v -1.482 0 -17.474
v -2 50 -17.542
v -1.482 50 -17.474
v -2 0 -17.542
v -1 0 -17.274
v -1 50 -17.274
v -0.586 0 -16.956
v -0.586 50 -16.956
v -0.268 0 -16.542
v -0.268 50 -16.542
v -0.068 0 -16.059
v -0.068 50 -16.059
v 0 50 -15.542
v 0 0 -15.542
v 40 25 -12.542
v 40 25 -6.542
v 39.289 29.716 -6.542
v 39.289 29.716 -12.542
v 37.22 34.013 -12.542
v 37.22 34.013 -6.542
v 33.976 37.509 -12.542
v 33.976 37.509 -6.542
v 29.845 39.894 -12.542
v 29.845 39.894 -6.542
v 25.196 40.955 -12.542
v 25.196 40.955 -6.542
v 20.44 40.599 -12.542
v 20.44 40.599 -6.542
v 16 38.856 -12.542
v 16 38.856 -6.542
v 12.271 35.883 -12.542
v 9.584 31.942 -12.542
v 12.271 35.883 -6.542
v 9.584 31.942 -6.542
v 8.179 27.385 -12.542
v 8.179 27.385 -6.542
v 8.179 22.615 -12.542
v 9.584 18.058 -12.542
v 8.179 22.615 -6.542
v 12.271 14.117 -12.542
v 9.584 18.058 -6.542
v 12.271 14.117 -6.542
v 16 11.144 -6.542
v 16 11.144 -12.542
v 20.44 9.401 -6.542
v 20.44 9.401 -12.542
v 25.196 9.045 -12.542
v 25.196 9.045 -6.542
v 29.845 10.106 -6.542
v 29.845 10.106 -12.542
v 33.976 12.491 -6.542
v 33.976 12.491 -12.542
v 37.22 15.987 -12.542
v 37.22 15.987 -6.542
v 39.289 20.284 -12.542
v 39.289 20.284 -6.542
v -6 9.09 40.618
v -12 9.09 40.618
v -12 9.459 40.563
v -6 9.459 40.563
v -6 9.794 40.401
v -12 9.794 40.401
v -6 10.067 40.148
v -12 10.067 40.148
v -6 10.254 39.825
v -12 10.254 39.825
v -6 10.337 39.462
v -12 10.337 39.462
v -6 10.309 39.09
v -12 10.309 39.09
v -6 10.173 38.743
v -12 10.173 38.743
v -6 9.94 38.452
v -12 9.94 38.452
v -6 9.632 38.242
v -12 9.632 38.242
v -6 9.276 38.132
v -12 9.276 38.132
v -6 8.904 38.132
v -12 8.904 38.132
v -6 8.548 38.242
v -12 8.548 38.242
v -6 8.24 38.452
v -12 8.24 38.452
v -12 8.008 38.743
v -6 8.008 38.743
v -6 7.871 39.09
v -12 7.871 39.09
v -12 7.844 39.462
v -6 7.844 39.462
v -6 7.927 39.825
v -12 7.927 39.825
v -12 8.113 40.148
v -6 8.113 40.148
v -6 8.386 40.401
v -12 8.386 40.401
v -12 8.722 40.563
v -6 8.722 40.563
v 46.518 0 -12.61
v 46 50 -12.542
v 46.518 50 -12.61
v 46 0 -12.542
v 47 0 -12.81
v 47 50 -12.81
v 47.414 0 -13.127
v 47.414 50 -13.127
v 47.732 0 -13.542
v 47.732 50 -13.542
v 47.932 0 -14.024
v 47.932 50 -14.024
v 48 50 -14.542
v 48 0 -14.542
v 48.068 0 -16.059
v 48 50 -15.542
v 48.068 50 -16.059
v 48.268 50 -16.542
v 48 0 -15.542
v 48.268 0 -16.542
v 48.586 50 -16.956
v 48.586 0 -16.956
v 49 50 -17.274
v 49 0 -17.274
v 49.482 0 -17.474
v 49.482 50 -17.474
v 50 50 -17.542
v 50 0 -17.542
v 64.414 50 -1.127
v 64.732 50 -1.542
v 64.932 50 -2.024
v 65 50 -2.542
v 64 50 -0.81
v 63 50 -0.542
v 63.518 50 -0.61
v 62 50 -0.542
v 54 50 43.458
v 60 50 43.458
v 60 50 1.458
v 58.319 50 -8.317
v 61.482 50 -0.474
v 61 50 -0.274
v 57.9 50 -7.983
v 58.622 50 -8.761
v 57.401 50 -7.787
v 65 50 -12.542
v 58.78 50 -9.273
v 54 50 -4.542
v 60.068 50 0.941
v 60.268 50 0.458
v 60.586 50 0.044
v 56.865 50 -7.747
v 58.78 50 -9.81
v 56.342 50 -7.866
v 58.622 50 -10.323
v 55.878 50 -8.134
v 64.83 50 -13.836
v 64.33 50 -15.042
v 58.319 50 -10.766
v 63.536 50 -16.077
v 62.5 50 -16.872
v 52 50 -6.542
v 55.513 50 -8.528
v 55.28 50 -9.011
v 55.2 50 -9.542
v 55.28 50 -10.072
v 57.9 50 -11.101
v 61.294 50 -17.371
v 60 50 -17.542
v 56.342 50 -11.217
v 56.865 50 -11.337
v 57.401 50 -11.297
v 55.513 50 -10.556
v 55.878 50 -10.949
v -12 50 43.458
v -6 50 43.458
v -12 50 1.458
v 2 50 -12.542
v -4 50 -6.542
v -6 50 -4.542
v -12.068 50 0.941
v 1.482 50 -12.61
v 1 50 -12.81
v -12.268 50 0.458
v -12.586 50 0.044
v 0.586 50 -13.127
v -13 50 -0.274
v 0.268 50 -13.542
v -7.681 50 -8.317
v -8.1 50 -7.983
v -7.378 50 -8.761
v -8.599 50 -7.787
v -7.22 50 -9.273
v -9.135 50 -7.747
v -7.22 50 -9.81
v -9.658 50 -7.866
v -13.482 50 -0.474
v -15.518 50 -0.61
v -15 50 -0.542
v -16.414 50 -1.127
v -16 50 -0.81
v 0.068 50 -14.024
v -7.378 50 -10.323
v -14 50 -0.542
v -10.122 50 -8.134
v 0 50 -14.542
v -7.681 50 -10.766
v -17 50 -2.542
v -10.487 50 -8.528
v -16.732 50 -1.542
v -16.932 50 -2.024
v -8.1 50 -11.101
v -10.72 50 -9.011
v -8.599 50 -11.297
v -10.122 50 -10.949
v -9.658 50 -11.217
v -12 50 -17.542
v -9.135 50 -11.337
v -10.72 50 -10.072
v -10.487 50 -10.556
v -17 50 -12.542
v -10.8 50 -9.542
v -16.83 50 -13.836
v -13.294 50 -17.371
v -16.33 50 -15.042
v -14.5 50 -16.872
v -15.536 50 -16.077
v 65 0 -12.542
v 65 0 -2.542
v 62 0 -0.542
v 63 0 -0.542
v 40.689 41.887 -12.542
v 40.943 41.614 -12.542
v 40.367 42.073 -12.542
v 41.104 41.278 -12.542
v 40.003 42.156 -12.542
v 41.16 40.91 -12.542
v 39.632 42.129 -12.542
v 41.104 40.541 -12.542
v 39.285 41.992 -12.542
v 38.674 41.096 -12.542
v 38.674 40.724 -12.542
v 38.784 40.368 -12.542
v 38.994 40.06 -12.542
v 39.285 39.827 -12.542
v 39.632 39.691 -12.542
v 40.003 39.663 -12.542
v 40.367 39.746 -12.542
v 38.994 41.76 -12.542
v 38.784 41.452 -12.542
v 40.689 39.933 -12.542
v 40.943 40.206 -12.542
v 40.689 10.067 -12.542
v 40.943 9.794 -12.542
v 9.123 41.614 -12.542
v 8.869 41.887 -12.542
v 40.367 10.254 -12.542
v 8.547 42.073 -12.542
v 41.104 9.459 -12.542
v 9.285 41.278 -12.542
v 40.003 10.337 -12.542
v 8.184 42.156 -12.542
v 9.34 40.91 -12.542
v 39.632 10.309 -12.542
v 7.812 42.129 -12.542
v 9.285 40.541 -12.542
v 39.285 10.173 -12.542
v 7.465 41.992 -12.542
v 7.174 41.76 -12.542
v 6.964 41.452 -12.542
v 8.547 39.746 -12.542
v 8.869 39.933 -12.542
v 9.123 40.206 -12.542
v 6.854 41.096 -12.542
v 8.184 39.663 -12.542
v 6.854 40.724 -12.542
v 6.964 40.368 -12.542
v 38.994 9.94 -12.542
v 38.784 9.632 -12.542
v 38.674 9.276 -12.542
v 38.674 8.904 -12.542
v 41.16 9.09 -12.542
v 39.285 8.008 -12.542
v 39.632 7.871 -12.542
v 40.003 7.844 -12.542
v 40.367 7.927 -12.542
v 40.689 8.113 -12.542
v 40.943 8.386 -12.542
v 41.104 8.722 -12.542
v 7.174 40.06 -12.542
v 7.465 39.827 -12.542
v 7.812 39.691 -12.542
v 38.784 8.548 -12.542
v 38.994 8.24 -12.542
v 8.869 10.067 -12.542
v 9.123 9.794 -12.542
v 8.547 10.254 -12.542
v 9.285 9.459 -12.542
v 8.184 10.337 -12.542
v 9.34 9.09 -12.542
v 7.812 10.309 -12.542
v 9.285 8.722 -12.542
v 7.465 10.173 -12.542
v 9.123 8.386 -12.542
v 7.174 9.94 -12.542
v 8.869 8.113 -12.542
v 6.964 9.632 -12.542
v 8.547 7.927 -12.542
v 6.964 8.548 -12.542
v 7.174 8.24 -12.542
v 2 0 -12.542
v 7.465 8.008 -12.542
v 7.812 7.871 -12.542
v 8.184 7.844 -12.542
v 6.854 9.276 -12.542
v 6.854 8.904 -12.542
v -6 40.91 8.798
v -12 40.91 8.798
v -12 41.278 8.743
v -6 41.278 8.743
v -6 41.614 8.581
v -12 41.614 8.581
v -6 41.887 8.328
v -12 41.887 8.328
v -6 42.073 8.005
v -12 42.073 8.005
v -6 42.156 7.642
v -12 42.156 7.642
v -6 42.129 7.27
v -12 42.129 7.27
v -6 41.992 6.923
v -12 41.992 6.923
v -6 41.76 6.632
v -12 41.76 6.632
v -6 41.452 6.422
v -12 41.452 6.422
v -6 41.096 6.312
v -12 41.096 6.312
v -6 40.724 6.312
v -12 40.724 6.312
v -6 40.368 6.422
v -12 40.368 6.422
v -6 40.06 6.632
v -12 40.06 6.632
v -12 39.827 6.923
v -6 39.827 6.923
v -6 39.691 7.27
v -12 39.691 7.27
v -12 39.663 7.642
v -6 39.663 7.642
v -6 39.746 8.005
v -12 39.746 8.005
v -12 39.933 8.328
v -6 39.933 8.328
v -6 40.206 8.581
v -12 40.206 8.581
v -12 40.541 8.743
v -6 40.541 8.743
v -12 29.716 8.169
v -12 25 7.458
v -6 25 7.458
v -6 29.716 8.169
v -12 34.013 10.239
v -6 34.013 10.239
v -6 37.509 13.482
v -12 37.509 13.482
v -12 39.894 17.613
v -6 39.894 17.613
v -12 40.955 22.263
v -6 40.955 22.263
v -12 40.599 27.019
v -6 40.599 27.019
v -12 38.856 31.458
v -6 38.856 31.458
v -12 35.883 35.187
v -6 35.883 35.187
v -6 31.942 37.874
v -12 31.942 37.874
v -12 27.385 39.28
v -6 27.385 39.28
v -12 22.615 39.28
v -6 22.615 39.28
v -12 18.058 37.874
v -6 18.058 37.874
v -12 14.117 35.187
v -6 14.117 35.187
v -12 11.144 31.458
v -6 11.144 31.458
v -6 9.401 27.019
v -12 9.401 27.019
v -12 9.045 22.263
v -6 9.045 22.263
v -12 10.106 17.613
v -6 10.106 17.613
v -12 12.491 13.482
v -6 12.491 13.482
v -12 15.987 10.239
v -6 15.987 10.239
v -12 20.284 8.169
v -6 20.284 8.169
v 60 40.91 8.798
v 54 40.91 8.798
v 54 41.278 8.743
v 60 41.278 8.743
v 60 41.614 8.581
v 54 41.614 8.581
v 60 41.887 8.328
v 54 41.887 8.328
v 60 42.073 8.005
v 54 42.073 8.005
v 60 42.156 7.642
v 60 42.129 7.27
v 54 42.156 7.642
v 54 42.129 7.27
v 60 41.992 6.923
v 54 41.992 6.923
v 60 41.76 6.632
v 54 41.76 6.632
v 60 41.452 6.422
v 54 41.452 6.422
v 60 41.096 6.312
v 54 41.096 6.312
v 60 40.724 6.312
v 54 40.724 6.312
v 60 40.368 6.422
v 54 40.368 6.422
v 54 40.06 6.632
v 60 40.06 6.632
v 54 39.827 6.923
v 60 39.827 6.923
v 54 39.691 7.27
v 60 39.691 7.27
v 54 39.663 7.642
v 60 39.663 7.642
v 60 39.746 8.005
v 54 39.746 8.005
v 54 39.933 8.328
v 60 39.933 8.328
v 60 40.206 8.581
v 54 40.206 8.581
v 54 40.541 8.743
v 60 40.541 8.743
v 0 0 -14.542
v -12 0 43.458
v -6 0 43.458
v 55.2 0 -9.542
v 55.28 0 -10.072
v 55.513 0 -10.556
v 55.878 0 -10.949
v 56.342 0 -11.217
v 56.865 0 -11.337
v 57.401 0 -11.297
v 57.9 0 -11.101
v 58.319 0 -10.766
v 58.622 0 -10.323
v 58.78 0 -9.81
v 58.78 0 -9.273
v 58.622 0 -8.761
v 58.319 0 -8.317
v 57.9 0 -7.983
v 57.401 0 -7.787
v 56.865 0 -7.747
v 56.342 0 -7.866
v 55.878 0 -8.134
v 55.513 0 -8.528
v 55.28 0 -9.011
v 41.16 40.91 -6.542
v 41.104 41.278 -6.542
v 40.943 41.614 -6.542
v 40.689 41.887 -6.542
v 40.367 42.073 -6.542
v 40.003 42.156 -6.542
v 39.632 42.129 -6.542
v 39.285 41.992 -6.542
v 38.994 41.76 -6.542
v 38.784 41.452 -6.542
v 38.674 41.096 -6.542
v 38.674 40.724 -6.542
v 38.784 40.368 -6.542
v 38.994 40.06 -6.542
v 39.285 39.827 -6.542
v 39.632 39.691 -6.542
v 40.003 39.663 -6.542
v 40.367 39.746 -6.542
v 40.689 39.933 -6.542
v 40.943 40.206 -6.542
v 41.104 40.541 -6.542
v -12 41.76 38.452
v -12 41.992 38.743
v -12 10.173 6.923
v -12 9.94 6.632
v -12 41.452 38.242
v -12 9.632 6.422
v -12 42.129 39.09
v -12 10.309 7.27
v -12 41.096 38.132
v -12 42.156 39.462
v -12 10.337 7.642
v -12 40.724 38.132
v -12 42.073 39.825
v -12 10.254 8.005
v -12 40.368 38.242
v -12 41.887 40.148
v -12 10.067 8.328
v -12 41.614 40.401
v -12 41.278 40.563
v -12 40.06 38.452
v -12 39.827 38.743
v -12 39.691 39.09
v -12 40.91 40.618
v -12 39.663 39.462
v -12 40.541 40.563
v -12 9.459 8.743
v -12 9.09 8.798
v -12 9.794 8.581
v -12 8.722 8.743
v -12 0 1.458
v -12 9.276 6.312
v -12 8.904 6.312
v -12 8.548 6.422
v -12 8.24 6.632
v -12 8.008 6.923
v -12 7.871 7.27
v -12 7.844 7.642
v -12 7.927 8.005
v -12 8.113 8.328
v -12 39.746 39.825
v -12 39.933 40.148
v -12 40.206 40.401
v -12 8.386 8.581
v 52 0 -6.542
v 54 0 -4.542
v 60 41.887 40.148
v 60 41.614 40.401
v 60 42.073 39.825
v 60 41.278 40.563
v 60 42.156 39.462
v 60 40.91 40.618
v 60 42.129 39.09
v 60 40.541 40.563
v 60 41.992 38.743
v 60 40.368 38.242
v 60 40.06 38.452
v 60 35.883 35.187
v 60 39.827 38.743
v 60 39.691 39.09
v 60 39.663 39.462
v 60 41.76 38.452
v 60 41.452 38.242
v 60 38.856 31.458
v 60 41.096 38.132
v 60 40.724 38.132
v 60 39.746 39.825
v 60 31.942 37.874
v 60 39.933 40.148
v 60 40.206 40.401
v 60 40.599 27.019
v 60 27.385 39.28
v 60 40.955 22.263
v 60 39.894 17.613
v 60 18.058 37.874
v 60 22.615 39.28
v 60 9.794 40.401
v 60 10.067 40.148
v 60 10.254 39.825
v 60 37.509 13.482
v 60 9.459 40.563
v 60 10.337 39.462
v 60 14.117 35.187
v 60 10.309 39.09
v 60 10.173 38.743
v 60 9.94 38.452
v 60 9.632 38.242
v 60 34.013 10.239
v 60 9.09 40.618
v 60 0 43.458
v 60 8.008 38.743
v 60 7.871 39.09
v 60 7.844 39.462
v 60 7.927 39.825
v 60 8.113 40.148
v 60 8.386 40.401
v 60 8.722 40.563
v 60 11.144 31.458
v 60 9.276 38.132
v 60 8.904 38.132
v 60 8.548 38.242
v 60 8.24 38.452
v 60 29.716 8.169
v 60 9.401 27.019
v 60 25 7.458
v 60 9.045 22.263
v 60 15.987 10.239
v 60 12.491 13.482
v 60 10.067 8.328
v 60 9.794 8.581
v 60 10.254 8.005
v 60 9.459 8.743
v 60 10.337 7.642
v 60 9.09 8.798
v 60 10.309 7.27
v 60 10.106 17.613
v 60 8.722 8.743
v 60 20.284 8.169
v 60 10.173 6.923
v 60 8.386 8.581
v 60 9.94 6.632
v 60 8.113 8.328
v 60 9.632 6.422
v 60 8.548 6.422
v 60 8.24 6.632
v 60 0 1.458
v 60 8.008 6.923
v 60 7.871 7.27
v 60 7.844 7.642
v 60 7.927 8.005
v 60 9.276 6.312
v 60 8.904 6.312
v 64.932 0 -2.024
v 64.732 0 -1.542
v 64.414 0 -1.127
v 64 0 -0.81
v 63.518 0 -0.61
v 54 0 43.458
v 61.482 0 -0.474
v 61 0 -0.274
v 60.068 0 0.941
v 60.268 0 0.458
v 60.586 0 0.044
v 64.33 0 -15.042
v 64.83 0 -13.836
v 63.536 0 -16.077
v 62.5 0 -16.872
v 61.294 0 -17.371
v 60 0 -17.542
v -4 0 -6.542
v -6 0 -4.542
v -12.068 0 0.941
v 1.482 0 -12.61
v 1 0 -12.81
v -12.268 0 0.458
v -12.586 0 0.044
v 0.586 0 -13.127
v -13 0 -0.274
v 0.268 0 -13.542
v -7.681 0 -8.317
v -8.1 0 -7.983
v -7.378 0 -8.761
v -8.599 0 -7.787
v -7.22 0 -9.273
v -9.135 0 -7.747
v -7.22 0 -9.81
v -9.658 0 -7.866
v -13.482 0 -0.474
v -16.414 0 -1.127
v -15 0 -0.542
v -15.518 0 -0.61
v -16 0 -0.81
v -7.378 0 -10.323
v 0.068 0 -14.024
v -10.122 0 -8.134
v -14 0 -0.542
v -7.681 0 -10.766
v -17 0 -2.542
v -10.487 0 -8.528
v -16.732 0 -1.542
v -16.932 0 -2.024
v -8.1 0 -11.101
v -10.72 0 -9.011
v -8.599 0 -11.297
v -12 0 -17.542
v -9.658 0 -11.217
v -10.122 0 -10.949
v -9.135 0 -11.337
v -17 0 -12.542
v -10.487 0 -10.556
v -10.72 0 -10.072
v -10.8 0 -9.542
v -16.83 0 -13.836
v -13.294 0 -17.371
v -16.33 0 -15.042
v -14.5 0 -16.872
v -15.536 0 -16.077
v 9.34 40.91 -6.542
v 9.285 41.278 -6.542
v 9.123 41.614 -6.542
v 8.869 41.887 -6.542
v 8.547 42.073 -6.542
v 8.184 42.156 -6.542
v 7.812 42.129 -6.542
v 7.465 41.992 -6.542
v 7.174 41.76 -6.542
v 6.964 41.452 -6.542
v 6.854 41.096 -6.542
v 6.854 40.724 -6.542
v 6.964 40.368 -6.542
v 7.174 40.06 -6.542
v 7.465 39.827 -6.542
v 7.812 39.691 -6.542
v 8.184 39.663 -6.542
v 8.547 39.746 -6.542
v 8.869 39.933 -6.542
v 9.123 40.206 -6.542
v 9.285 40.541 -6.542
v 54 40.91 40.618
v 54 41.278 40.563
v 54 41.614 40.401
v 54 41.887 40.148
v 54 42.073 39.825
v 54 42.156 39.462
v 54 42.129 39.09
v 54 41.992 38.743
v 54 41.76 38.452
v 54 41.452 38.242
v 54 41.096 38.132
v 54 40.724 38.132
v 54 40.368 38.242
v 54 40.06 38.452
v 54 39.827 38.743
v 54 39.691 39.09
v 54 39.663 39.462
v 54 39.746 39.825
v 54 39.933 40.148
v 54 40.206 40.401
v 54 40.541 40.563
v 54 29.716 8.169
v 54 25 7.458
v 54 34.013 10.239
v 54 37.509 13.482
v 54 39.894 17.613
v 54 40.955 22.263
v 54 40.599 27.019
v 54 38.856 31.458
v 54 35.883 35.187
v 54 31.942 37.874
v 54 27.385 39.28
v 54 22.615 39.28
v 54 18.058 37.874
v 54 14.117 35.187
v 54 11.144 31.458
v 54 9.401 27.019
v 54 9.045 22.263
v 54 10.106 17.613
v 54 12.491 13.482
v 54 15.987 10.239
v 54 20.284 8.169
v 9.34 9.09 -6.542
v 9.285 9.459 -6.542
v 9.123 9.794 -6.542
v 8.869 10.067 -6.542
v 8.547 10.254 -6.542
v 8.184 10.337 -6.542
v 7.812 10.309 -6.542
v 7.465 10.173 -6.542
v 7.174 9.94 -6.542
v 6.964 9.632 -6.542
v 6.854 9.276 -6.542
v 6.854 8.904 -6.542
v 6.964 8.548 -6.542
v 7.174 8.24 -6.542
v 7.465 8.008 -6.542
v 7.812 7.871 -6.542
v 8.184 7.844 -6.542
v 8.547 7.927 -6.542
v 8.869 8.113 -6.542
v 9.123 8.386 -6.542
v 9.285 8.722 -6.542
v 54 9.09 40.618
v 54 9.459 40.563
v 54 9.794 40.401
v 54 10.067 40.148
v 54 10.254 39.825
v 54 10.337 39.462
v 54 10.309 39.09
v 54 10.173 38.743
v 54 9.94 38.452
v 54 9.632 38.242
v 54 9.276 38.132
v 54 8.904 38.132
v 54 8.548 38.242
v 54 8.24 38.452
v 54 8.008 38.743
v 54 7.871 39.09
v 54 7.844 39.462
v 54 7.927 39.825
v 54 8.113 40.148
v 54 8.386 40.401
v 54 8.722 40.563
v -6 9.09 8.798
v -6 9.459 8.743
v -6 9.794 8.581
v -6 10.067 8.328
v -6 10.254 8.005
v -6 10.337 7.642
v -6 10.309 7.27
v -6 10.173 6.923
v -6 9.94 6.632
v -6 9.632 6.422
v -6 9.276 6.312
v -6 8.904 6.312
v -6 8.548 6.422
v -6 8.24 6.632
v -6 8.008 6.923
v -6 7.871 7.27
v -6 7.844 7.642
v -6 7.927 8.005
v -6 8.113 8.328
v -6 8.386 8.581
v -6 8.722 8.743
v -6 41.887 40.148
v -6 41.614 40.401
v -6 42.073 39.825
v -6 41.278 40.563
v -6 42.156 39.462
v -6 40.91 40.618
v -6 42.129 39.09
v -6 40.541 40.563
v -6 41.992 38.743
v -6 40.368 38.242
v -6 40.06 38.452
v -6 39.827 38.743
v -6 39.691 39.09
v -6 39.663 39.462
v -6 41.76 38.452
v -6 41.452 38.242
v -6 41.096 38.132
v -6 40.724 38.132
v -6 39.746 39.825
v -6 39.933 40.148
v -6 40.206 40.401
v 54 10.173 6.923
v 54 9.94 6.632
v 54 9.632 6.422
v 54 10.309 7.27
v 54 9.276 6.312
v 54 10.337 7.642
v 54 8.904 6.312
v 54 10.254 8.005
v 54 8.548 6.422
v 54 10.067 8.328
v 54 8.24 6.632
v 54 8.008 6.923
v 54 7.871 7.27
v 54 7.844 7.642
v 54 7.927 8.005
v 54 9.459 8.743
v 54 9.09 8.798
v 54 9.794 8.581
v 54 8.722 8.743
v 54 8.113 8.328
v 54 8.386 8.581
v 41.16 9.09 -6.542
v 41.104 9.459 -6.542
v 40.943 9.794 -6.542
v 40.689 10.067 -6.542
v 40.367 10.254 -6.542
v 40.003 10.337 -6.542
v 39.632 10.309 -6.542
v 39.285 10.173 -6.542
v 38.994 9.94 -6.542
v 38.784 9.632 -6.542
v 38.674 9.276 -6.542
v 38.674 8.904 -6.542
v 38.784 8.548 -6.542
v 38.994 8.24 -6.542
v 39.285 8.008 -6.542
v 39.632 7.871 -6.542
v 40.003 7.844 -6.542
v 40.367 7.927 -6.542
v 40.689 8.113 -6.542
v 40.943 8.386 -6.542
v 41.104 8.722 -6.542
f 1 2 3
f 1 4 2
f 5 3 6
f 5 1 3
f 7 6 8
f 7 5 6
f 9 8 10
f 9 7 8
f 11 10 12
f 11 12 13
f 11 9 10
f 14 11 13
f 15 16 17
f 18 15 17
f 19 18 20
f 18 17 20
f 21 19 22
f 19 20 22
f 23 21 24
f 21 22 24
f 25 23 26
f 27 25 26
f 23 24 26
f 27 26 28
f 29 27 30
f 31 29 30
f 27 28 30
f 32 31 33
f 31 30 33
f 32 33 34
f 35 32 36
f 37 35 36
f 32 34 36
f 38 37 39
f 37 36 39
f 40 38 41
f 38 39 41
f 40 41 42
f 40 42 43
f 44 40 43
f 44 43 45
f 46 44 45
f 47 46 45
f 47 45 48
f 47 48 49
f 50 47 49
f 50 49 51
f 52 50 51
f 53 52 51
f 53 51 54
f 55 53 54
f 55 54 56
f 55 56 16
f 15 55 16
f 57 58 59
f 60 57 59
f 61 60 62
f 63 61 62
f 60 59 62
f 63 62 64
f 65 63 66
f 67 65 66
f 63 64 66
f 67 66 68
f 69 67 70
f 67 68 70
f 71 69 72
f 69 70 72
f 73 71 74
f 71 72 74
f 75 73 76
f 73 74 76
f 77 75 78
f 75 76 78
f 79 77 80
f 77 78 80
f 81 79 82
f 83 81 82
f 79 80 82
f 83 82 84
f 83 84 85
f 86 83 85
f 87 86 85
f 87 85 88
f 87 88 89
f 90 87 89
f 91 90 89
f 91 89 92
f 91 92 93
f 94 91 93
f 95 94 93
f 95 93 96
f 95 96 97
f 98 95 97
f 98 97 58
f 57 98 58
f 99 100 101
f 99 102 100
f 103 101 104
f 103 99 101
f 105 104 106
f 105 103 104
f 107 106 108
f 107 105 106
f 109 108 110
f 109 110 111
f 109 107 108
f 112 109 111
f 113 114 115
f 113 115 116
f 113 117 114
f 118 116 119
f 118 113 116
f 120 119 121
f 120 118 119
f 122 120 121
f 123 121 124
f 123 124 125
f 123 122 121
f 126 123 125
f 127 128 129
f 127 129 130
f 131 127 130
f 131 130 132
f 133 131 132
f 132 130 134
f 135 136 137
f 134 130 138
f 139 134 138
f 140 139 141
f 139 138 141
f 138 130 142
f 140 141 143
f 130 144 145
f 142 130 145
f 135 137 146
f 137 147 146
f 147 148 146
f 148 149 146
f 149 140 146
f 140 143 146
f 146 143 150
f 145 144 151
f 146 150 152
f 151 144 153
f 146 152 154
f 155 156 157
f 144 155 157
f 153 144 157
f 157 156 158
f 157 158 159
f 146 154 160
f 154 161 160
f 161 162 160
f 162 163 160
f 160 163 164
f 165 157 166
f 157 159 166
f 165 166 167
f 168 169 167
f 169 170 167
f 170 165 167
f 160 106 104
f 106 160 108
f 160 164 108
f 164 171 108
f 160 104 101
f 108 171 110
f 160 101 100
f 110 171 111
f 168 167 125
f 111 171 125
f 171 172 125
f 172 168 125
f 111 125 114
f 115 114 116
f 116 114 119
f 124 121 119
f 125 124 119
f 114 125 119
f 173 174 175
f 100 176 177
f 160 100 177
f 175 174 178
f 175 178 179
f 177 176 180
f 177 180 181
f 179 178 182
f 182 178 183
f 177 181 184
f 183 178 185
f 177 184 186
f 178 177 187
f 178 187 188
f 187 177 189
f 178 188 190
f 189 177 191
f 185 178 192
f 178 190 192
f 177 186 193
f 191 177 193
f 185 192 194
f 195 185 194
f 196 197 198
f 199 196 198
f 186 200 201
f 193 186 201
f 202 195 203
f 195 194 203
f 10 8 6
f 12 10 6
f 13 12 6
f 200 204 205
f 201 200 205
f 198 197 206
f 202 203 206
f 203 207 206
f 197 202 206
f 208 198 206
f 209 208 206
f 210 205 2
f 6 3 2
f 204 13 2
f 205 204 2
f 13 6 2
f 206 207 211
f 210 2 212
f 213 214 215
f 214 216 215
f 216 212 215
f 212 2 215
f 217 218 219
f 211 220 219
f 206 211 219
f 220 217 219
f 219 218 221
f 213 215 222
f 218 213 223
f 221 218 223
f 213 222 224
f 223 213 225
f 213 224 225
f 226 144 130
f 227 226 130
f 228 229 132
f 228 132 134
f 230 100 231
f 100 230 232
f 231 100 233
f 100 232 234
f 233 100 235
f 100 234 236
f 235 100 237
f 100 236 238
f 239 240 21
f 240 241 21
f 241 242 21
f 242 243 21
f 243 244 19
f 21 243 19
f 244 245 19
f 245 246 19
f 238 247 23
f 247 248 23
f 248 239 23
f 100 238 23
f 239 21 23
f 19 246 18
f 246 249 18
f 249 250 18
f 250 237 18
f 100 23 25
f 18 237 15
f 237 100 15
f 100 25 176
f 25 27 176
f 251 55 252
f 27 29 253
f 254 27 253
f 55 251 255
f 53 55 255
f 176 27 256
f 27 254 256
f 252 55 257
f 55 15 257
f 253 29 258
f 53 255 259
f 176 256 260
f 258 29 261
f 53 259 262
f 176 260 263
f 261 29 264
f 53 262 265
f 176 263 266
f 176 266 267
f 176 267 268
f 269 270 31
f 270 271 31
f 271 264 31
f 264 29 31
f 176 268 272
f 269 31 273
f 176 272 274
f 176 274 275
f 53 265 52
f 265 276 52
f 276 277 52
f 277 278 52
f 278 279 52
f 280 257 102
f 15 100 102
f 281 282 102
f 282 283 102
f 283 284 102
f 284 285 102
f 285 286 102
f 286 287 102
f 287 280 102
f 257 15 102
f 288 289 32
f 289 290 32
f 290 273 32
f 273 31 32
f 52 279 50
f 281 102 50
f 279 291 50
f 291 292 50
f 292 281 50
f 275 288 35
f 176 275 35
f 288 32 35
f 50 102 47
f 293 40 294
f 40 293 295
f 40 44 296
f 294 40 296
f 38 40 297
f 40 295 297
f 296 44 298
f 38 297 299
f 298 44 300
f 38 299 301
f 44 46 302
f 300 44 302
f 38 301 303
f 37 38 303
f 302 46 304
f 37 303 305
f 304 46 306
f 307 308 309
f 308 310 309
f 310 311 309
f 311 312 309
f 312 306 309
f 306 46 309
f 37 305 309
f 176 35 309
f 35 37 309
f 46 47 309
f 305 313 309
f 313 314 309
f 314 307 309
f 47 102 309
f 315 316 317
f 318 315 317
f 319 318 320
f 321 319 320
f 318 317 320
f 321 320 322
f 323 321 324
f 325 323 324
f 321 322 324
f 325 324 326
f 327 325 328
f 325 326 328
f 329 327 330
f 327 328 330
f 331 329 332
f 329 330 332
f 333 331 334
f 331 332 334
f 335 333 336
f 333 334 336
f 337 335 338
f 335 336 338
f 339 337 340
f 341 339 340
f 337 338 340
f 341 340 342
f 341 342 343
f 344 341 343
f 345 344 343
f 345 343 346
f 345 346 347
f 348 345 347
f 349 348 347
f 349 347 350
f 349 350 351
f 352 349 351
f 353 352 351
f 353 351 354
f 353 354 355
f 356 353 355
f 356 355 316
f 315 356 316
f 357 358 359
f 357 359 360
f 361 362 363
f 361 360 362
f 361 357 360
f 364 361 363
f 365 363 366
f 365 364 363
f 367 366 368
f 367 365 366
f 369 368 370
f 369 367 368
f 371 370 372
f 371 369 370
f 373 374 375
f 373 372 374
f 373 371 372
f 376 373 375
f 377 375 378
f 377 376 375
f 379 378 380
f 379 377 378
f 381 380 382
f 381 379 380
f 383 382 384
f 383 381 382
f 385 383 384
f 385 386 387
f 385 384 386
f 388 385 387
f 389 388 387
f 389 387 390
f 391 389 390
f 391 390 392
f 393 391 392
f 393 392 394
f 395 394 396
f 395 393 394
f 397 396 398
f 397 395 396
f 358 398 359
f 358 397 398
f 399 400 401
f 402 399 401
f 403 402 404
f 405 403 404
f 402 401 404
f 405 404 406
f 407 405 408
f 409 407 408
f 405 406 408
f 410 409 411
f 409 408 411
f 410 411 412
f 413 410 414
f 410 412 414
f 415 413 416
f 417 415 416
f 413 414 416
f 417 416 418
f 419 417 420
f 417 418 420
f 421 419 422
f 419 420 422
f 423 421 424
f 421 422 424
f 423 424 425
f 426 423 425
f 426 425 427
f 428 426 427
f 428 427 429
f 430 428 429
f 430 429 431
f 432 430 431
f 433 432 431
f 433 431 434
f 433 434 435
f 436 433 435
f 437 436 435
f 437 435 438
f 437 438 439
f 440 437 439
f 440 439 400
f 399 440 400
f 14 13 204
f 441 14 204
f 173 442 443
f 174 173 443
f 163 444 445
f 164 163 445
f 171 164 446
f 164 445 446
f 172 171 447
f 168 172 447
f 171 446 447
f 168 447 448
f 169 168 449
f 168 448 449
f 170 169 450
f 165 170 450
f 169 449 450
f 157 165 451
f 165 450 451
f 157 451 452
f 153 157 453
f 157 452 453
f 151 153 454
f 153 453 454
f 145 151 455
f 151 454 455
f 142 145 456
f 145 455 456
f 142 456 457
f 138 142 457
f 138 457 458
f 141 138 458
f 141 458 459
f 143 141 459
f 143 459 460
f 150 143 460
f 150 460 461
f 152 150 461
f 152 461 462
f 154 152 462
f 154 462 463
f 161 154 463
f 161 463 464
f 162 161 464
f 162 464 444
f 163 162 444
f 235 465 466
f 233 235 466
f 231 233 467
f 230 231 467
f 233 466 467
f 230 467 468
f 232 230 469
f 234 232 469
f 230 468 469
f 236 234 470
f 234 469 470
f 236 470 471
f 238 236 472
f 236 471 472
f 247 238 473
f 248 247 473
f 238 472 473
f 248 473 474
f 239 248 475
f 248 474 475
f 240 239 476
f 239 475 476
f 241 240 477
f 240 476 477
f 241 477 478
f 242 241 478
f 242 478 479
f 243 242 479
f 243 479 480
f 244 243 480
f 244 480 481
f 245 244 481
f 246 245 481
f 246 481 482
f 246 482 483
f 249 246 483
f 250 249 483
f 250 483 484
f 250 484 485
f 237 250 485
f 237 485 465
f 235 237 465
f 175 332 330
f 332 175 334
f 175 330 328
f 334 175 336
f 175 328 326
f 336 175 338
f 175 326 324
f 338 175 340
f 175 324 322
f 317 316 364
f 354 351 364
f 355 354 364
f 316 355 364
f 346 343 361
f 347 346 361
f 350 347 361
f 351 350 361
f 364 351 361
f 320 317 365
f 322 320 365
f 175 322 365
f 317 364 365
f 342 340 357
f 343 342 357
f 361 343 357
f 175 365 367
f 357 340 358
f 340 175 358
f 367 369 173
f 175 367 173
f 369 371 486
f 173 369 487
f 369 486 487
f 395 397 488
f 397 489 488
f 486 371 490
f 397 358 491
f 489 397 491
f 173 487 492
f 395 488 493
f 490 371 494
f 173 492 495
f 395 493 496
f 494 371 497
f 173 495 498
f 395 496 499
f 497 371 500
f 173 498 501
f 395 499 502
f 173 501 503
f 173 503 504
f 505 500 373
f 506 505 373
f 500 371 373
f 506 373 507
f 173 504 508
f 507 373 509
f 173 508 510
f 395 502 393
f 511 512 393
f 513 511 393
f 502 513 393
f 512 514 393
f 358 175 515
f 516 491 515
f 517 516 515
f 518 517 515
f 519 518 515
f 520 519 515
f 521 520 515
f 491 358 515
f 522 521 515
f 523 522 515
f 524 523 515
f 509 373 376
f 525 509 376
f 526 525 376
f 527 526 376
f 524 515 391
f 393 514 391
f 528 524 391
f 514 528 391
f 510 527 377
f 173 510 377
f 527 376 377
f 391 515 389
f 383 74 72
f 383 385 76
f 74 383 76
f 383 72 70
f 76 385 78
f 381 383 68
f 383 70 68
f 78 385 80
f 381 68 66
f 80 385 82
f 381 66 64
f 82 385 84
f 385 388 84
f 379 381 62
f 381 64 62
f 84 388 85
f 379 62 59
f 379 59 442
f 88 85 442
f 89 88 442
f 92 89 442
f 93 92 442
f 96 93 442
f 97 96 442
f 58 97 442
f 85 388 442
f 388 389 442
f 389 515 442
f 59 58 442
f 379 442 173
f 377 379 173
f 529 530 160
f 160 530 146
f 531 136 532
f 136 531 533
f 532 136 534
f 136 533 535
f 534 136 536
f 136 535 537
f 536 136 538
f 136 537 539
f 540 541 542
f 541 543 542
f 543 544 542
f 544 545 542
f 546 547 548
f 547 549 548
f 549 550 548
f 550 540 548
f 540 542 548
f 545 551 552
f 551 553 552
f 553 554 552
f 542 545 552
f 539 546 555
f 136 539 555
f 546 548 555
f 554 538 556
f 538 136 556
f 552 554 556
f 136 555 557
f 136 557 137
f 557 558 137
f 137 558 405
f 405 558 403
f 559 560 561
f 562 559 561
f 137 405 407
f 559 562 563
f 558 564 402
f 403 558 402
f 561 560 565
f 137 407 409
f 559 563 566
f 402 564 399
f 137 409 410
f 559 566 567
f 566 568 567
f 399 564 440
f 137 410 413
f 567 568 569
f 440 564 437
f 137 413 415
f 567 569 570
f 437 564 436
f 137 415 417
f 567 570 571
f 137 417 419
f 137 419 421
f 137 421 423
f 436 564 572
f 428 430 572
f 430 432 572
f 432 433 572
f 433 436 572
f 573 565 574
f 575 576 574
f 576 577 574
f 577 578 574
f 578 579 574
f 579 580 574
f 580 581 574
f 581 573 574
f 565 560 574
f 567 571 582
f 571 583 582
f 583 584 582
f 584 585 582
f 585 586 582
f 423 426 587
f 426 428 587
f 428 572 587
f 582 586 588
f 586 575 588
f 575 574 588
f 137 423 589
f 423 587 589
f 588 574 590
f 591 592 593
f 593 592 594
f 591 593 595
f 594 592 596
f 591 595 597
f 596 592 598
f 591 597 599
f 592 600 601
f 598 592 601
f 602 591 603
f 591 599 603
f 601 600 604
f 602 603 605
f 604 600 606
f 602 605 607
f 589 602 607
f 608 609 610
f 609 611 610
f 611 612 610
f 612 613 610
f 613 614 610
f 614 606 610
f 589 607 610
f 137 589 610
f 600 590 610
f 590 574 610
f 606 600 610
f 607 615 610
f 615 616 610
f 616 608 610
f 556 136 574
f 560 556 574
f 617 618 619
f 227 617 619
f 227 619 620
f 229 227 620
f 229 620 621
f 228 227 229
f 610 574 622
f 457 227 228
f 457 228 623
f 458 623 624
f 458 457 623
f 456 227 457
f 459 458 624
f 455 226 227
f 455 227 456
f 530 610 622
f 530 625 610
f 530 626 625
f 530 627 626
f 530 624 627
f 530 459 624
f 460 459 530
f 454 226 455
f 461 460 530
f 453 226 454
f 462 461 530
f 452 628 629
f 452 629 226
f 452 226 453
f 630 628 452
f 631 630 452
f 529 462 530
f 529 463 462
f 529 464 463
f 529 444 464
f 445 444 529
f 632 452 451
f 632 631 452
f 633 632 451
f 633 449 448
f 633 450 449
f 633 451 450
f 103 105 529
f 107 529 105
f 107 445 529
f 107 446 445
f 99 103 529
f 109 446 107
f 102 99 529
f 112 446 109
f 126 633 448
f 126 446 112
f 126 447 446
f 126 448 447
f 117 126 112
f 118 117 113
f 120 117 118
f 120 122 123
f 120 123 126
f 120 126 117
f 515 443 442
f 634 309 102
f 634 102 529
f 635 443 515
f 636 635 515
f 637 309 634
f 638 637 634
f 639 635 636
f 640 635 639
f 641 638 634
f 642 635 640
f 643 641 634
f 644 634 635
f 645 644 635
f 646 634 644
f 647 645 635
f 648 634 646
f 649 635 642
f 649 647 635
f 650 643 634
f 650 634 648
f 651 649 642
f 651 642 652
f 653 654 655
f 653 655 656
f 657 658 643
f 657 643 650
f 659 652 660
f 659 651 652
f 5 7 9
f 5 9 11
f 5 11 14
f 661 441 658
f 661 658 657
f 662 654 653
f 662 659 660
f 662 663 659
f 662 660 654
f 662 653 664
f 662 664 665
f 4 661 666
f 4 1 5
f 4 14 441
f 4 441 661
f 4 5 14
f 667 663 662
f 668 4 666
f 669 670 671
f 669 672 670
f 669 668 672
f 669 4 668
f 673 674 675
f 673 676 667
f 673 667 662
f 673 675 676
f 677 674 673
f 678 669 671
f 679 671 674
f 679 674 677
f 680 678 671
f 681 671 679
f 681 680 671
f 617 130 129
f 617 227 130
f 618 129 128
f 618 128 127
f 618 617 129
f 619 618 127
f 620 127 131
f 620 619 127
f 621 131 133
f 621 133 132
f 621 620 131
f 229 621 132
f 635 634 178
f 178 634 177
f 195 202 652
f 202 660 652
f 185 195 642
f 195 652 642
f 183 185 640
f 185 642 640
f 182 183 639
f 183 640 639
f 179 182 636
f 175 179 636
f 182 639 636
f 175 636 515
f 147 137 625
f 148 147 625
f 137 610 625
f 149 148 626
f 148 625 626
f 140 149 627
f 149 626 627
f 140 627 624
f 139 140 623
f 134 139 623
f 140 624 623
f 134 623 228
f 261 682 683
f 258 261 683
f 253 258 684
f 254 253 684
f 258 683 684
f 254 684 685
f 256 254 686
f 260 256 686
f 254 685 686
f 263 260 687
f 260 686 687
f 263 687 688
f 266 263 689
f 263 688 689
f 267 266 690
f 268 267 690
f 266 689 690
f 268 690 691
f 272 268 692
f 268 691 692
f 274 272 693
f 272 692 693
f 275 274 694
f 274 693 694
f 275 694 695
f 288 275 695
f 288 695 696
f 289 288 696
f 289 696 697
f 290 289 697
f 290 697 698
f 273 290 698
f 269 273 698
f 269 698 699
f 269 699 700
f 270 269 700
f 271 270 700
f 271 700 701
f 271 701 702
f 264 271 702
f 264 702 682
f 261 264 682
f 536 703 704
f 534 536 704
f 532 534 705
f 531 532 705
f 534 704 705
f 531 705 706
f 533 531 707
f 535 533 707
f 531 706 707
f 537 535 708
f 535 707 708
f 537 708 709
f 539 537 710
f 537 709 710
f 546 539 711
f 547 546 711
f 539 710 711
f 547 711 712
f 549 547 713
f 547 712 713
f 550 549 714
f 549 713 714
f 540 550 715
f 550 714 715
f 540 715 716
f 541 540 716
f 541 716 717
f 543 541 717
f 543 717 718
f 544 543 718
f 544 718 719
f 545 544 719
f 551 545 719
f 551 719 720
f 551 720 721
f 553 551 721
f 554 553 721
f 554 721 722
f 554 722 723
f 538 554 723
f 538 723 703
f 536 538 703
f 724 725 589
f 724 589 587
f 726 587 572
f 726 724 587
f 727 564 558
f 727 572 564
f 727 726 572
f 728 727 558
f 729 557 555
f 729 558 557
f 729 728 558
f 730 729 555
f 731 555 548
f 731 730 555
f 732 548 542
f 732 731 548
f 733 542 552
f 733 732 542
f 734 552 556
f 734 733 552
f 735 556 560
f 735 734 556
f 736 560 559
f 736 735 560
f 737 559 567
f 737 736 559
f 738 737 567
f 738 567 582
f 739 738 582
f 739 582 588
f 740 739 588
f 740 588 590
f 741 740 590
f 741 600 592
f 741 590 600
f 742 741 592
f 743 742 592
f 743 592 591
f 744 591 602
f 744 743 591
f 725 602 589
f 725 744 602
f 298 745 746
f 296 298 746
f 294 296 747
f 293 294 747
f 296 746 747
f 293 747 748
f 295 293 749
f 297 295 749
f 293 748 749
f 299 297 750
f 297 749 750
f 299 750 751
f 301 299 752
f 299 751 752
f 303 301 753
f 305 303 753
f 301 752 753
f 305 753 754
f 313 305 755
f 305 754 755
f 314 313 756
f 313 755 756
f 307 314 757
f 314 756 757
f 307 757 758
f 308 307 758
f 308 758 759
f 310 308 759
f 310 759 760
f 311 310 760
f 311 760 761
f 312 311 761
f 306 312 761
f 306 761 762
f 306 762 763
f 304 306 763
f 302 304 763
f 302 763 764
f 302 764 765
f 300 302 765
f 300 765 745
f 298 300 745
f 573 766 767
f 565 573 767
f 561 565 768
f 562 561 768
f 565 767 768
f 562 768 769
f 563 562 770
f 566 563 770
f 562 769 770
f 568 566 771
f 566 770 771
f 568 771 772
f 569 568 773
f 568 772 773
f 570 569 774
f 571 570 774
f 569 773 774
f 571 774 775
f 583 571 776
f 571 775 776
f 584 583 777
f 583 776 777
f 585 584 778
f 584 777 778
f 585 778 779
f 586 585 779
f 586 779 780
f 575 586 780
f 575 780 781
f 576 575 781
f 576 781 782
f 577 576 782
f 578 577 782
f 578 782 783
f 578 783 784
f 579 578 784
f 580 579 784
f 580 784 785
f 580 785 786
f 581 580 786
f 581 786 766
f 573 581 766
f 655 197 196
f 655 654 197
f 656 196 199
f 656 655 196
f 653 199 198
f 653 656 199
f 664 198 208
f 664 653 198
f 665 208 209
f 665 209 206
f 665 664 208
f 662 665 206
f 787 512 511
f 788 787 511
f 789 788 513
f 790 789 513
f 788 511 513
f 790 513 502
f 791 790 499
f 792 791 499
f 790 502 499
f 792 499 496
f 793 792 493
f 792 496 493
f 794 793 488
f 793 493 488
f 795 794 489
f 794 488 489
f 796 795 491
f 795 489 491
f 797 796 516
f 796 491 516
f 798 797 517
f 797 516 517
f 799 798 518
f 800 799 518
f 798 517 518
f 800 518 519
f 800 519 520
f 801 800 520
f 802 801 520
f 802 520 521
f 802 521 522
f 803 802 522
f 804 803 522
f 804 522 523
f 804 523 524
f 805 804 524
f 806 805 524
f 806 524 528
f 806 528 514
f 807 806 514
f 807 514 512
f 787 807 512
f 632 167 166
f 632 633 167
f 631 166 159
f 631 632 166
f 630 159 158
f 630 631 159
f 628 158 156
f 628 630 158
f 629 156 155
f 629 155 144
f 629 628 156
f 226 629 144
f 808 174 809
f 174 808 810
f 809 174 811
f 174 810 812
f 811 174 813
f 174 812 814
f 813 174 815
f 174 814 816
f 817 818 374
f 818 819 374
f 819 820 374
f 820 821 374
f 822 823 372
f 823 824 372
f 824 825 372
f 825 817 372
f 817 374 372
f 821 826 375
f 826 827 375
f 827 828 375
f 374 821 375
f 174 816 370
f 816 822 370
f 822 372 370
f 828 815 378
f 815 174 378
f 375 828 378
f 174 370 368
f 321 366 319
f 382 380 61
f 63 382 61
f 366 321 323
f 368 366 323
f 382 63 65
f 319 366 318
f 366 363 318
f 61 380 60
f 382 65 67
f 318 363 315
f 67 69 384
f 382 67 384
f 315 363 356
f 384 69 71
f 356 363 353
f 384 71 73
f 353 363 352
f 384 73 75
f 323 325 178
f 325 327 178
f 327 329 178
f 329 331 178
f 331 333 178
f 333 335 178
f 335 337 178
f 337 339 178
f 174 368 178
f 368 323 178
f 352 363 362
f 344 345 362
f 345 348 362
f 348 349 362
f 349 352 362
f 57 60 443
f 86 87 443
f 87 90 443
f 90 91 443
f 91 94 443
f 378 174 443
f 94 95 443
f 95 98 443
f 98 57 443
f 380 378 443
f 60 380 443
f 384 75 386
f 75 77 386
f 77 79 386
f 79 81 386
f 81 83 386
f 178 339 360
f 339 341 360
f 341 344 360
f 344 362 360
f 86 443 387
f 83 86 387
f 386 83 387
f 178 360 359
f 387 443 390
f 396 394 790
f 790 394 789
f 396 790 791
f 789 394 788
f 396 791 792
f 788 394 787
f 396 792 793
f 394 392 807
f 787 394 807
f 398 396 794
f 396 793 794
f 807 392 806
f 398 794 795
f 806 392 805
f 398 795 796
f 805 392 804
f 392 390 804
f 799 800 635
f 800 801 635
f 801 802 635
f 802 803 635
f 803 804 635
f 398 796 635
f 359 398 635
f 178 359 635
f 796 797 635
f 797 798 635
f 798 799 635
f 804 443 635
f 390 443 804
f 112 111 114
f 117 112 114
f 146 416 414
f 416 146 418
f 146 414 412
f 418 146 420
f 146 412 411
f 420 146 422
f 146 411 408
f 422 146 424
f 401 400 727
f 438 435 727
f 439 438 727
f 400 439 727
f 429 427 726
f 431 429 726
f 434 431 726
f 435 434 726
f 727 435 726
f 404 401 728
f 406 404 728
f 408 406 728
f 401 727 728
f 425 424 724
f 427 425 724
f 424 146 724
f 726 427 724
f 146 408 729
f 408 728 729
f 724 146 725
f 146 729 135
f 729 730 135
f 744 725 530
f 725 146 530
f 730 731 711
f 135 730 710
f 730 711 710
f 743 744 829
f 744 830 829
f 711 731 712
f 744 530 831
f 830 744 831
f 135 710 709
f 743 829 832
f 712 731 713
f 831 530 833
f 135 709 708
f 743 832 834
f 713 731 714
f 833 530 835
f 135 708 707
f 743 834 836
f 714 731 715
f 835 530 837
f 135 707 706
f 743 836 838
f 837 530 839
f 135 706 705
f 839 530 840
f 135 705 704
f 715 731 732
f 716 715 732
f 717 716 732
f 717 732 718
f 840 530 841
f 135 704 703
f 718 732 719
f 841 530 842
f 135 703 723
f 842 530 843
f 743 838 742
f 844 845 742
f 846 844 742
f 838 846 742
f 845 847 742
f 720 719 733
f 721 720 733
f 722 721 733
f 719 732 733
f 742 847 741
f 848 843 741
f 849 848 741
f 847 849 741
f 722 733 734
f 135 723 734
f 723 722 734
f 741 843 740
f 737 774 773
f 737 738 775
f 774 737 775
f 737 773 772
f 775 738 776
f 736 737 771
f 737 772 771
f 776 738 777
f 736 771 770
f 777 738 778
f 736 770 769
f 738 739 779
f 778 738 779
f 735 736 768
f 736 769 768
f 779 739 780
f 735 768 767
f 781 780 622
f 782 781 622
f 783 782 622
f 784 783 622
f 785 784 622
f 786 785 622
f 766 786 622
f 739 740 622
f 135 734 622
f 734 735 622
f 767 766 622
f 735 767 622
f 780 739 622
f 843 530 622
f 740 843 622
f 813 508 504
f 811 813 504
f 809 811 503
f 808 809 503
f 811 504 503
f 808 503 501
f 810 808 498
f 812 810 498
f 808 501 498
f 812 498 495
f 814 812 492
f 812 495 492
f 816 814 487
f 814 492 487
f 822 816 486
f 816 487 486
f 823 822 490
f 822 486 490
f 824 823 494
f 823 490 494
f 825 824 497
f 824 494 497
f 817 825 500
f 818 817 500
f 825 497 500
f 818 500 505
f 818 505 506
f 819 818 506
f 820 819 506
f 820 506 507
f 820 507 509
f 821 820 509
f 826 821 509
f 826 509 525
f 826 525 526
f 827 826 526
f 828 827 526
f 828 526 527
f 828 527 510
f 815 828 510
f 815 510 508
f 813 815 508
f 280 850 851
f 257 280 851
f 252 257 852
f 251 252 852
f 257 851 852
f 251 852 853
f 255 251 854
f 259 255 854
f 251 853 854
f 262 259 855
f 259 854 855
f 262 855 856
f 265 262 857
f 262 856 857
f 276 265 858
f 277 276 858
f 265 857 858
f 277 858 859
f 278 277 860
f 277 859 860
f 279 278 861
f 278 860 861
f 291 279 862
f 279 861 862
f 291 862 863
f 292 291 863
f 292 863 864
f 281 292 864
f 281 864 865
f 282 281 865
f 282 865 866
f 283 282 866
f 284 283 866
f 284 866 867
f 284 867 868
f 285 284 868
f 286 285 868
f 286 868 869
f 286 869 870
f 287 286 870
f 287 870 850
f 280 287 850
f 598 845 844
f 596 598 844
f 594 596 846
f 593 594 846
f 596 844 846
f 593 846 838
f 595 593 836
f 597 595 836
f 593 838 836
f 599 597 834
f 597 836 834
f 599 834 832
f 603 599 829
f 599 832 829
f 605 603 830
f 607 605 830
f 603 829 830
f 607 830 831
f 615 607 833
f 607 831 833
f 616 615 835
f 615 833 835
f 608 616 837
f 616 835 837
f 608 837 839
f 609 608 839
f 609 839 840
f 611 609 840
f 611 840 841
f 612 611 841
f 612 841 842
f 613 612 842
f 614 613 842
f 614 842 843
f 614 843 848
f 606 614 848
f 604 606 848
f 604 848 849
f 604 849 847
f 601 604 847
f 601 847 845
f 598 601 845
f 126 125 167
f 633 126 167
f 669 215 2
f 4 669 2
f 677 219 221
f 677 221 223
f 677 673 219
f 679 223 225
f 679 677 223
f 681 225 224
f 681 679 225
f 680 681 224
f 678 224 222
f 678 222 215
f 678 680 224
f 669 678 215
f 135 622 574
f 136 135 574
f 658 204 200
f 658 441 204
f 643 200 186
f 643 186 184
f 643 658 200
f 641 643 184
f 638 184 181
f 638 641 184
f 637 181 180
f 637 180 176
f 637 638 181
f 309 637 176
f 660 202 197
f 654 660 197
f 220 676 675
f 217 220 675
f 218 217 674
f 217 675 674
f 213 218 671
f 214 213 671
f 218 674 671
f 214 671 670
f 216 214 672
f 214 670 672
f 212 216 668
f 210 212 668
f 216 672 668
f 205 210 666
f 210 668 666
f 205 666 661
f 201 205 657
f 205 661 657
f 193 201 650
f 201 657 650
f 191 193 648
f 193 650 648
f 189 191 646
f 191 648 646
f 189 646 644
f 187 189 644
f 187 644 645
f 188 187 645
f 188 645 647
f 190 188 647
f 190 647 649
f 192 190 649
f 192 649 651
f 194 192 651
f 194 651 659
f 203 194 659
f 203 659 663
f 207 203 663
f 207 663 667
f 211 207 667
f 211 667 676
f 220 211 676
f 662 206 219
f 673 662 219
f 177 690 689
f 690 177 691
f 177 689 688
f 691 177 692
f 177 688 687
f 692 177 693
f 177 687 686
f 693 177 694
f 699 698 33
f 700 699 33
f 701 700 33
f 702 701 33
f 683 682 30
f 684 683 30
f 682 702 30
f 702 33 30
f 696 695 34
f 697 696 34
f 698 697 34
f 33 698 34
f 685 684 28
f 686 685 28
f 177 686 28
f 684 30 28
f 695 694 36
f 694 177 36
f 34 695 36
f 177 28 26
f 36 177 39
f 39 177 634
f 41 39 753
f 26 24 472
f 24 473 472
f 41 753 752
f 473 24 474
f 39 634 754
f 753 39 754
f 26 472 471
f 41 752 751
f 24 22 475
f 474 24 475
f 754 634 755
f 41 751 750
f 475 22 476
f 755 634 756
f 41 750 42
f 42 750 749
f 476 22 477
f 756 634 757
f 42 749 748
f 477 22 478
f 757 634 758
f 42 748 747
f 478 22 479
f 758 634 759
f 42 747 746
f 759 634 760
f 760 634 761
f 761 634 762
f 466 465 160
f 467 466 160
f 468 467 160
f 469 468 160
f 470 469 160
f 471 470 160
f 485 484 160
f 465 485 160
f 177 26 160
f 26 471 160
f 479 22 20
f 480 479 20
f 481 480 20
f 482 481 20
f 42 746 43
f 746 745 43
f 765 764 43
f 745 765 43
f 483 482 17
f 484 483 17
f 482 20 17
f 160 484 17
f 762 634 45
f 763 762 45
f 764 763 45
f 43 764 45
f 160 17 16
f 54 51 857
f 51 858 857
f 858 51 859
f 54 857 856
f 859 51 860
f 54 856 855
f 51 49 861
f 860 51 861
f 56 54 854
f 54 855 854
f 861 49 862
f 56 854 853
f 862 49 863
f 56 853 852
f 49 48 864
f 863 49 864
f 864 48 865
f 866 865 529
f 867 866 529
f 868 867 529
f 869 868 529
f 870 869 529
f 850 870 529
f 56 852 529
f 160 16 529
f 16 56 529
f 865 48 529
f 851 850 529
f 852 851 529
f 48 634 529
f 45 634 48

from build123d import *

# Parameters (mm, degrees)
BOSS_EXTRUDE1_DEPTH     = 50
CUT_EXTRUDE1_DEPTH      = 94.512708955
CUT_EXTRUDE1_DEPTH_BACK = 94.512708955
SKETCH2_R               = 16
SKETCH3_R               = 16
CUT_EXTRUDE2_DEPTH      = 93.736184955
TAP_DRILL_FOR_M3_TAP1_D = 2.5
TAP_DRILL_FOR_M3_TAP2_D = 2.5
CHAMFER1_SIZE           = 2
BOSS_EXTRUDE2_DEPTH     = 50
FILLET1_R               = 2
FILLET2_R               = 5
M3_CLEARANCE_HOLE1_D    = 3.6


with BuildPart() as part:
    # Sketch1 → Boss-Extrude1 (new body)
    with BuildSketch(Plane(origin=(0, 0, 0), x_dir=(1, 0, 0), z_dir=(0, 1, 0))):
        Polygon((-12, -43.458333333), (-6, -43.458333333), (-6, 6.541666667), (54, 6.541666667), (54, -43.458333333), (60, -43.458333333), (60, 12.541666667), (-12, 12.541666667), align=None)
    extrude(amount=BOSS_EXTRUDE1_DEPTH)

    # Sketch2 → Cut-Extrude1 (cut, two sides: drawn at the far end of the back side and taken through both)
    with BuildSketch(Plane(origin=(-6, 0, 0), x_dir=(0, 0, -1), z_dir=(1, 0, 0)).offset(-CUT_EXTRUDE1_DEPTH_BACK)):
        with Locations((-23.458333333, 25)):
            Circle(SKETCH2_R)
    extrude(amount=CUT_EXTRUDE1_DEPTH + CUT_EXTRUDE1_DEPTH_BACK, mode=Mode.SUBTRACT)

    # Sketch3 → Cut-Extrude2 (cut, through all)
    with BuildSketch(Plane.XY.offset(-6.541666667)):
        with Locations((24, 25)):
            Circle(SKETCH3_R)
    extrude(amount=-CUT_EXTRUDE2_DEPTH, mode=Mode.SUBTRACT)

    # Tap Drill for M3 Tap1 (through all)
    with Locations(Plane(origin=(60, 0, 0), x_dir=(0, 0, -1), z_dir=(1, 0, 0))):
        with Locations((-39.36823591, 9.090097423), (-39.36823591, 40.909902577), (-7.548430757, 40.909902577), (-7.548430757, 9.090097423)):
            Hole(TAP_DRILL_FOR_M3_TAP1_D / 2)

    # Tap Drill for M3 Tap2 (through all)
    with Locations(Plane(origin=(0, 0, -12.541666667), x_dir=(-1, 0, 0), z_dir=(0, 0, -1))):
        with Locations((-39.909902577, 9.090097423), (-39.909902577, 40.909902577), (-8.090097423, 40.909902577), (-8.090097423, 9.090097423)):
            Hole(TAP_DRILL_FOR_M3_TAP2_D / 2)

    # Chamfer1
    chamfer1_edges = [part.edges().sort_by_distance(p)[0] for p in [
        (54, 25, -6.541666667),
        (-6, 25, -6.541666667),
    ]]
    chamfer(chamfer1_edges, length=CHAMFER1_SIZE)

    # Sketch9 → Boss-Extrude2 (add)
    with BuildSketch(Plane(origin=(0, 50, 0), x_dir=(1, 0, 0), z_dir=(0, 1, 0))):
        Polygon((-12, 0.541666667), (-17, 0.541666667), (-17, 17.541666667), (0, 17.541666667), (0, 12.541666667), (-12, 12.541666667), align=None)
        Polygon((65, 17.541666667), (65, 0.541666667), (60, 0.541666667), (60, 12.541666667), (48, 12.541666667), (48, 17.541666667), align=None)
    extrude(amount=-BOSS_EXTRUDE2_DEPTH)

    # Fillet1
    fillet1_edges = [part.edges().sort_by_distance(p)[0] for p in [
        (-12, 25, -0.541666667),
        (-17, 25, -0.541666667),
        (0, 25, -17.541666667),
        (0, 25, -12.541666667),
        (48, 25, -17.541666667),
        (65, 25, -0.541666667),
        (60, 25, -0.541666667),
        (48, 25, -12.541666667),
    ]]
    fillet(fillet1_edges, radius=FILLET1_R)

    # Fillet2
    fillet2_edges = [part.edges().sort_by_distance(p)[0] for p in [
        (-17, 25, -17.541666667),
        (65, 25, -17.541666667),
    ]]
    fillet(fillet2_edges, radius=FILLET2_R)

    # M3 Clearance Hole1 (through all)
    with Locations(Plane(origin=(0, 50, 0), x_dir=(1, 0, 0), z_dir=(0, 1, 0))):
        with Locations((-9, 9.541666667), (57, 9.541666667)):
            Hole(M3_CLEARANCE_HOLE1_D / 2)


solid = part.part
